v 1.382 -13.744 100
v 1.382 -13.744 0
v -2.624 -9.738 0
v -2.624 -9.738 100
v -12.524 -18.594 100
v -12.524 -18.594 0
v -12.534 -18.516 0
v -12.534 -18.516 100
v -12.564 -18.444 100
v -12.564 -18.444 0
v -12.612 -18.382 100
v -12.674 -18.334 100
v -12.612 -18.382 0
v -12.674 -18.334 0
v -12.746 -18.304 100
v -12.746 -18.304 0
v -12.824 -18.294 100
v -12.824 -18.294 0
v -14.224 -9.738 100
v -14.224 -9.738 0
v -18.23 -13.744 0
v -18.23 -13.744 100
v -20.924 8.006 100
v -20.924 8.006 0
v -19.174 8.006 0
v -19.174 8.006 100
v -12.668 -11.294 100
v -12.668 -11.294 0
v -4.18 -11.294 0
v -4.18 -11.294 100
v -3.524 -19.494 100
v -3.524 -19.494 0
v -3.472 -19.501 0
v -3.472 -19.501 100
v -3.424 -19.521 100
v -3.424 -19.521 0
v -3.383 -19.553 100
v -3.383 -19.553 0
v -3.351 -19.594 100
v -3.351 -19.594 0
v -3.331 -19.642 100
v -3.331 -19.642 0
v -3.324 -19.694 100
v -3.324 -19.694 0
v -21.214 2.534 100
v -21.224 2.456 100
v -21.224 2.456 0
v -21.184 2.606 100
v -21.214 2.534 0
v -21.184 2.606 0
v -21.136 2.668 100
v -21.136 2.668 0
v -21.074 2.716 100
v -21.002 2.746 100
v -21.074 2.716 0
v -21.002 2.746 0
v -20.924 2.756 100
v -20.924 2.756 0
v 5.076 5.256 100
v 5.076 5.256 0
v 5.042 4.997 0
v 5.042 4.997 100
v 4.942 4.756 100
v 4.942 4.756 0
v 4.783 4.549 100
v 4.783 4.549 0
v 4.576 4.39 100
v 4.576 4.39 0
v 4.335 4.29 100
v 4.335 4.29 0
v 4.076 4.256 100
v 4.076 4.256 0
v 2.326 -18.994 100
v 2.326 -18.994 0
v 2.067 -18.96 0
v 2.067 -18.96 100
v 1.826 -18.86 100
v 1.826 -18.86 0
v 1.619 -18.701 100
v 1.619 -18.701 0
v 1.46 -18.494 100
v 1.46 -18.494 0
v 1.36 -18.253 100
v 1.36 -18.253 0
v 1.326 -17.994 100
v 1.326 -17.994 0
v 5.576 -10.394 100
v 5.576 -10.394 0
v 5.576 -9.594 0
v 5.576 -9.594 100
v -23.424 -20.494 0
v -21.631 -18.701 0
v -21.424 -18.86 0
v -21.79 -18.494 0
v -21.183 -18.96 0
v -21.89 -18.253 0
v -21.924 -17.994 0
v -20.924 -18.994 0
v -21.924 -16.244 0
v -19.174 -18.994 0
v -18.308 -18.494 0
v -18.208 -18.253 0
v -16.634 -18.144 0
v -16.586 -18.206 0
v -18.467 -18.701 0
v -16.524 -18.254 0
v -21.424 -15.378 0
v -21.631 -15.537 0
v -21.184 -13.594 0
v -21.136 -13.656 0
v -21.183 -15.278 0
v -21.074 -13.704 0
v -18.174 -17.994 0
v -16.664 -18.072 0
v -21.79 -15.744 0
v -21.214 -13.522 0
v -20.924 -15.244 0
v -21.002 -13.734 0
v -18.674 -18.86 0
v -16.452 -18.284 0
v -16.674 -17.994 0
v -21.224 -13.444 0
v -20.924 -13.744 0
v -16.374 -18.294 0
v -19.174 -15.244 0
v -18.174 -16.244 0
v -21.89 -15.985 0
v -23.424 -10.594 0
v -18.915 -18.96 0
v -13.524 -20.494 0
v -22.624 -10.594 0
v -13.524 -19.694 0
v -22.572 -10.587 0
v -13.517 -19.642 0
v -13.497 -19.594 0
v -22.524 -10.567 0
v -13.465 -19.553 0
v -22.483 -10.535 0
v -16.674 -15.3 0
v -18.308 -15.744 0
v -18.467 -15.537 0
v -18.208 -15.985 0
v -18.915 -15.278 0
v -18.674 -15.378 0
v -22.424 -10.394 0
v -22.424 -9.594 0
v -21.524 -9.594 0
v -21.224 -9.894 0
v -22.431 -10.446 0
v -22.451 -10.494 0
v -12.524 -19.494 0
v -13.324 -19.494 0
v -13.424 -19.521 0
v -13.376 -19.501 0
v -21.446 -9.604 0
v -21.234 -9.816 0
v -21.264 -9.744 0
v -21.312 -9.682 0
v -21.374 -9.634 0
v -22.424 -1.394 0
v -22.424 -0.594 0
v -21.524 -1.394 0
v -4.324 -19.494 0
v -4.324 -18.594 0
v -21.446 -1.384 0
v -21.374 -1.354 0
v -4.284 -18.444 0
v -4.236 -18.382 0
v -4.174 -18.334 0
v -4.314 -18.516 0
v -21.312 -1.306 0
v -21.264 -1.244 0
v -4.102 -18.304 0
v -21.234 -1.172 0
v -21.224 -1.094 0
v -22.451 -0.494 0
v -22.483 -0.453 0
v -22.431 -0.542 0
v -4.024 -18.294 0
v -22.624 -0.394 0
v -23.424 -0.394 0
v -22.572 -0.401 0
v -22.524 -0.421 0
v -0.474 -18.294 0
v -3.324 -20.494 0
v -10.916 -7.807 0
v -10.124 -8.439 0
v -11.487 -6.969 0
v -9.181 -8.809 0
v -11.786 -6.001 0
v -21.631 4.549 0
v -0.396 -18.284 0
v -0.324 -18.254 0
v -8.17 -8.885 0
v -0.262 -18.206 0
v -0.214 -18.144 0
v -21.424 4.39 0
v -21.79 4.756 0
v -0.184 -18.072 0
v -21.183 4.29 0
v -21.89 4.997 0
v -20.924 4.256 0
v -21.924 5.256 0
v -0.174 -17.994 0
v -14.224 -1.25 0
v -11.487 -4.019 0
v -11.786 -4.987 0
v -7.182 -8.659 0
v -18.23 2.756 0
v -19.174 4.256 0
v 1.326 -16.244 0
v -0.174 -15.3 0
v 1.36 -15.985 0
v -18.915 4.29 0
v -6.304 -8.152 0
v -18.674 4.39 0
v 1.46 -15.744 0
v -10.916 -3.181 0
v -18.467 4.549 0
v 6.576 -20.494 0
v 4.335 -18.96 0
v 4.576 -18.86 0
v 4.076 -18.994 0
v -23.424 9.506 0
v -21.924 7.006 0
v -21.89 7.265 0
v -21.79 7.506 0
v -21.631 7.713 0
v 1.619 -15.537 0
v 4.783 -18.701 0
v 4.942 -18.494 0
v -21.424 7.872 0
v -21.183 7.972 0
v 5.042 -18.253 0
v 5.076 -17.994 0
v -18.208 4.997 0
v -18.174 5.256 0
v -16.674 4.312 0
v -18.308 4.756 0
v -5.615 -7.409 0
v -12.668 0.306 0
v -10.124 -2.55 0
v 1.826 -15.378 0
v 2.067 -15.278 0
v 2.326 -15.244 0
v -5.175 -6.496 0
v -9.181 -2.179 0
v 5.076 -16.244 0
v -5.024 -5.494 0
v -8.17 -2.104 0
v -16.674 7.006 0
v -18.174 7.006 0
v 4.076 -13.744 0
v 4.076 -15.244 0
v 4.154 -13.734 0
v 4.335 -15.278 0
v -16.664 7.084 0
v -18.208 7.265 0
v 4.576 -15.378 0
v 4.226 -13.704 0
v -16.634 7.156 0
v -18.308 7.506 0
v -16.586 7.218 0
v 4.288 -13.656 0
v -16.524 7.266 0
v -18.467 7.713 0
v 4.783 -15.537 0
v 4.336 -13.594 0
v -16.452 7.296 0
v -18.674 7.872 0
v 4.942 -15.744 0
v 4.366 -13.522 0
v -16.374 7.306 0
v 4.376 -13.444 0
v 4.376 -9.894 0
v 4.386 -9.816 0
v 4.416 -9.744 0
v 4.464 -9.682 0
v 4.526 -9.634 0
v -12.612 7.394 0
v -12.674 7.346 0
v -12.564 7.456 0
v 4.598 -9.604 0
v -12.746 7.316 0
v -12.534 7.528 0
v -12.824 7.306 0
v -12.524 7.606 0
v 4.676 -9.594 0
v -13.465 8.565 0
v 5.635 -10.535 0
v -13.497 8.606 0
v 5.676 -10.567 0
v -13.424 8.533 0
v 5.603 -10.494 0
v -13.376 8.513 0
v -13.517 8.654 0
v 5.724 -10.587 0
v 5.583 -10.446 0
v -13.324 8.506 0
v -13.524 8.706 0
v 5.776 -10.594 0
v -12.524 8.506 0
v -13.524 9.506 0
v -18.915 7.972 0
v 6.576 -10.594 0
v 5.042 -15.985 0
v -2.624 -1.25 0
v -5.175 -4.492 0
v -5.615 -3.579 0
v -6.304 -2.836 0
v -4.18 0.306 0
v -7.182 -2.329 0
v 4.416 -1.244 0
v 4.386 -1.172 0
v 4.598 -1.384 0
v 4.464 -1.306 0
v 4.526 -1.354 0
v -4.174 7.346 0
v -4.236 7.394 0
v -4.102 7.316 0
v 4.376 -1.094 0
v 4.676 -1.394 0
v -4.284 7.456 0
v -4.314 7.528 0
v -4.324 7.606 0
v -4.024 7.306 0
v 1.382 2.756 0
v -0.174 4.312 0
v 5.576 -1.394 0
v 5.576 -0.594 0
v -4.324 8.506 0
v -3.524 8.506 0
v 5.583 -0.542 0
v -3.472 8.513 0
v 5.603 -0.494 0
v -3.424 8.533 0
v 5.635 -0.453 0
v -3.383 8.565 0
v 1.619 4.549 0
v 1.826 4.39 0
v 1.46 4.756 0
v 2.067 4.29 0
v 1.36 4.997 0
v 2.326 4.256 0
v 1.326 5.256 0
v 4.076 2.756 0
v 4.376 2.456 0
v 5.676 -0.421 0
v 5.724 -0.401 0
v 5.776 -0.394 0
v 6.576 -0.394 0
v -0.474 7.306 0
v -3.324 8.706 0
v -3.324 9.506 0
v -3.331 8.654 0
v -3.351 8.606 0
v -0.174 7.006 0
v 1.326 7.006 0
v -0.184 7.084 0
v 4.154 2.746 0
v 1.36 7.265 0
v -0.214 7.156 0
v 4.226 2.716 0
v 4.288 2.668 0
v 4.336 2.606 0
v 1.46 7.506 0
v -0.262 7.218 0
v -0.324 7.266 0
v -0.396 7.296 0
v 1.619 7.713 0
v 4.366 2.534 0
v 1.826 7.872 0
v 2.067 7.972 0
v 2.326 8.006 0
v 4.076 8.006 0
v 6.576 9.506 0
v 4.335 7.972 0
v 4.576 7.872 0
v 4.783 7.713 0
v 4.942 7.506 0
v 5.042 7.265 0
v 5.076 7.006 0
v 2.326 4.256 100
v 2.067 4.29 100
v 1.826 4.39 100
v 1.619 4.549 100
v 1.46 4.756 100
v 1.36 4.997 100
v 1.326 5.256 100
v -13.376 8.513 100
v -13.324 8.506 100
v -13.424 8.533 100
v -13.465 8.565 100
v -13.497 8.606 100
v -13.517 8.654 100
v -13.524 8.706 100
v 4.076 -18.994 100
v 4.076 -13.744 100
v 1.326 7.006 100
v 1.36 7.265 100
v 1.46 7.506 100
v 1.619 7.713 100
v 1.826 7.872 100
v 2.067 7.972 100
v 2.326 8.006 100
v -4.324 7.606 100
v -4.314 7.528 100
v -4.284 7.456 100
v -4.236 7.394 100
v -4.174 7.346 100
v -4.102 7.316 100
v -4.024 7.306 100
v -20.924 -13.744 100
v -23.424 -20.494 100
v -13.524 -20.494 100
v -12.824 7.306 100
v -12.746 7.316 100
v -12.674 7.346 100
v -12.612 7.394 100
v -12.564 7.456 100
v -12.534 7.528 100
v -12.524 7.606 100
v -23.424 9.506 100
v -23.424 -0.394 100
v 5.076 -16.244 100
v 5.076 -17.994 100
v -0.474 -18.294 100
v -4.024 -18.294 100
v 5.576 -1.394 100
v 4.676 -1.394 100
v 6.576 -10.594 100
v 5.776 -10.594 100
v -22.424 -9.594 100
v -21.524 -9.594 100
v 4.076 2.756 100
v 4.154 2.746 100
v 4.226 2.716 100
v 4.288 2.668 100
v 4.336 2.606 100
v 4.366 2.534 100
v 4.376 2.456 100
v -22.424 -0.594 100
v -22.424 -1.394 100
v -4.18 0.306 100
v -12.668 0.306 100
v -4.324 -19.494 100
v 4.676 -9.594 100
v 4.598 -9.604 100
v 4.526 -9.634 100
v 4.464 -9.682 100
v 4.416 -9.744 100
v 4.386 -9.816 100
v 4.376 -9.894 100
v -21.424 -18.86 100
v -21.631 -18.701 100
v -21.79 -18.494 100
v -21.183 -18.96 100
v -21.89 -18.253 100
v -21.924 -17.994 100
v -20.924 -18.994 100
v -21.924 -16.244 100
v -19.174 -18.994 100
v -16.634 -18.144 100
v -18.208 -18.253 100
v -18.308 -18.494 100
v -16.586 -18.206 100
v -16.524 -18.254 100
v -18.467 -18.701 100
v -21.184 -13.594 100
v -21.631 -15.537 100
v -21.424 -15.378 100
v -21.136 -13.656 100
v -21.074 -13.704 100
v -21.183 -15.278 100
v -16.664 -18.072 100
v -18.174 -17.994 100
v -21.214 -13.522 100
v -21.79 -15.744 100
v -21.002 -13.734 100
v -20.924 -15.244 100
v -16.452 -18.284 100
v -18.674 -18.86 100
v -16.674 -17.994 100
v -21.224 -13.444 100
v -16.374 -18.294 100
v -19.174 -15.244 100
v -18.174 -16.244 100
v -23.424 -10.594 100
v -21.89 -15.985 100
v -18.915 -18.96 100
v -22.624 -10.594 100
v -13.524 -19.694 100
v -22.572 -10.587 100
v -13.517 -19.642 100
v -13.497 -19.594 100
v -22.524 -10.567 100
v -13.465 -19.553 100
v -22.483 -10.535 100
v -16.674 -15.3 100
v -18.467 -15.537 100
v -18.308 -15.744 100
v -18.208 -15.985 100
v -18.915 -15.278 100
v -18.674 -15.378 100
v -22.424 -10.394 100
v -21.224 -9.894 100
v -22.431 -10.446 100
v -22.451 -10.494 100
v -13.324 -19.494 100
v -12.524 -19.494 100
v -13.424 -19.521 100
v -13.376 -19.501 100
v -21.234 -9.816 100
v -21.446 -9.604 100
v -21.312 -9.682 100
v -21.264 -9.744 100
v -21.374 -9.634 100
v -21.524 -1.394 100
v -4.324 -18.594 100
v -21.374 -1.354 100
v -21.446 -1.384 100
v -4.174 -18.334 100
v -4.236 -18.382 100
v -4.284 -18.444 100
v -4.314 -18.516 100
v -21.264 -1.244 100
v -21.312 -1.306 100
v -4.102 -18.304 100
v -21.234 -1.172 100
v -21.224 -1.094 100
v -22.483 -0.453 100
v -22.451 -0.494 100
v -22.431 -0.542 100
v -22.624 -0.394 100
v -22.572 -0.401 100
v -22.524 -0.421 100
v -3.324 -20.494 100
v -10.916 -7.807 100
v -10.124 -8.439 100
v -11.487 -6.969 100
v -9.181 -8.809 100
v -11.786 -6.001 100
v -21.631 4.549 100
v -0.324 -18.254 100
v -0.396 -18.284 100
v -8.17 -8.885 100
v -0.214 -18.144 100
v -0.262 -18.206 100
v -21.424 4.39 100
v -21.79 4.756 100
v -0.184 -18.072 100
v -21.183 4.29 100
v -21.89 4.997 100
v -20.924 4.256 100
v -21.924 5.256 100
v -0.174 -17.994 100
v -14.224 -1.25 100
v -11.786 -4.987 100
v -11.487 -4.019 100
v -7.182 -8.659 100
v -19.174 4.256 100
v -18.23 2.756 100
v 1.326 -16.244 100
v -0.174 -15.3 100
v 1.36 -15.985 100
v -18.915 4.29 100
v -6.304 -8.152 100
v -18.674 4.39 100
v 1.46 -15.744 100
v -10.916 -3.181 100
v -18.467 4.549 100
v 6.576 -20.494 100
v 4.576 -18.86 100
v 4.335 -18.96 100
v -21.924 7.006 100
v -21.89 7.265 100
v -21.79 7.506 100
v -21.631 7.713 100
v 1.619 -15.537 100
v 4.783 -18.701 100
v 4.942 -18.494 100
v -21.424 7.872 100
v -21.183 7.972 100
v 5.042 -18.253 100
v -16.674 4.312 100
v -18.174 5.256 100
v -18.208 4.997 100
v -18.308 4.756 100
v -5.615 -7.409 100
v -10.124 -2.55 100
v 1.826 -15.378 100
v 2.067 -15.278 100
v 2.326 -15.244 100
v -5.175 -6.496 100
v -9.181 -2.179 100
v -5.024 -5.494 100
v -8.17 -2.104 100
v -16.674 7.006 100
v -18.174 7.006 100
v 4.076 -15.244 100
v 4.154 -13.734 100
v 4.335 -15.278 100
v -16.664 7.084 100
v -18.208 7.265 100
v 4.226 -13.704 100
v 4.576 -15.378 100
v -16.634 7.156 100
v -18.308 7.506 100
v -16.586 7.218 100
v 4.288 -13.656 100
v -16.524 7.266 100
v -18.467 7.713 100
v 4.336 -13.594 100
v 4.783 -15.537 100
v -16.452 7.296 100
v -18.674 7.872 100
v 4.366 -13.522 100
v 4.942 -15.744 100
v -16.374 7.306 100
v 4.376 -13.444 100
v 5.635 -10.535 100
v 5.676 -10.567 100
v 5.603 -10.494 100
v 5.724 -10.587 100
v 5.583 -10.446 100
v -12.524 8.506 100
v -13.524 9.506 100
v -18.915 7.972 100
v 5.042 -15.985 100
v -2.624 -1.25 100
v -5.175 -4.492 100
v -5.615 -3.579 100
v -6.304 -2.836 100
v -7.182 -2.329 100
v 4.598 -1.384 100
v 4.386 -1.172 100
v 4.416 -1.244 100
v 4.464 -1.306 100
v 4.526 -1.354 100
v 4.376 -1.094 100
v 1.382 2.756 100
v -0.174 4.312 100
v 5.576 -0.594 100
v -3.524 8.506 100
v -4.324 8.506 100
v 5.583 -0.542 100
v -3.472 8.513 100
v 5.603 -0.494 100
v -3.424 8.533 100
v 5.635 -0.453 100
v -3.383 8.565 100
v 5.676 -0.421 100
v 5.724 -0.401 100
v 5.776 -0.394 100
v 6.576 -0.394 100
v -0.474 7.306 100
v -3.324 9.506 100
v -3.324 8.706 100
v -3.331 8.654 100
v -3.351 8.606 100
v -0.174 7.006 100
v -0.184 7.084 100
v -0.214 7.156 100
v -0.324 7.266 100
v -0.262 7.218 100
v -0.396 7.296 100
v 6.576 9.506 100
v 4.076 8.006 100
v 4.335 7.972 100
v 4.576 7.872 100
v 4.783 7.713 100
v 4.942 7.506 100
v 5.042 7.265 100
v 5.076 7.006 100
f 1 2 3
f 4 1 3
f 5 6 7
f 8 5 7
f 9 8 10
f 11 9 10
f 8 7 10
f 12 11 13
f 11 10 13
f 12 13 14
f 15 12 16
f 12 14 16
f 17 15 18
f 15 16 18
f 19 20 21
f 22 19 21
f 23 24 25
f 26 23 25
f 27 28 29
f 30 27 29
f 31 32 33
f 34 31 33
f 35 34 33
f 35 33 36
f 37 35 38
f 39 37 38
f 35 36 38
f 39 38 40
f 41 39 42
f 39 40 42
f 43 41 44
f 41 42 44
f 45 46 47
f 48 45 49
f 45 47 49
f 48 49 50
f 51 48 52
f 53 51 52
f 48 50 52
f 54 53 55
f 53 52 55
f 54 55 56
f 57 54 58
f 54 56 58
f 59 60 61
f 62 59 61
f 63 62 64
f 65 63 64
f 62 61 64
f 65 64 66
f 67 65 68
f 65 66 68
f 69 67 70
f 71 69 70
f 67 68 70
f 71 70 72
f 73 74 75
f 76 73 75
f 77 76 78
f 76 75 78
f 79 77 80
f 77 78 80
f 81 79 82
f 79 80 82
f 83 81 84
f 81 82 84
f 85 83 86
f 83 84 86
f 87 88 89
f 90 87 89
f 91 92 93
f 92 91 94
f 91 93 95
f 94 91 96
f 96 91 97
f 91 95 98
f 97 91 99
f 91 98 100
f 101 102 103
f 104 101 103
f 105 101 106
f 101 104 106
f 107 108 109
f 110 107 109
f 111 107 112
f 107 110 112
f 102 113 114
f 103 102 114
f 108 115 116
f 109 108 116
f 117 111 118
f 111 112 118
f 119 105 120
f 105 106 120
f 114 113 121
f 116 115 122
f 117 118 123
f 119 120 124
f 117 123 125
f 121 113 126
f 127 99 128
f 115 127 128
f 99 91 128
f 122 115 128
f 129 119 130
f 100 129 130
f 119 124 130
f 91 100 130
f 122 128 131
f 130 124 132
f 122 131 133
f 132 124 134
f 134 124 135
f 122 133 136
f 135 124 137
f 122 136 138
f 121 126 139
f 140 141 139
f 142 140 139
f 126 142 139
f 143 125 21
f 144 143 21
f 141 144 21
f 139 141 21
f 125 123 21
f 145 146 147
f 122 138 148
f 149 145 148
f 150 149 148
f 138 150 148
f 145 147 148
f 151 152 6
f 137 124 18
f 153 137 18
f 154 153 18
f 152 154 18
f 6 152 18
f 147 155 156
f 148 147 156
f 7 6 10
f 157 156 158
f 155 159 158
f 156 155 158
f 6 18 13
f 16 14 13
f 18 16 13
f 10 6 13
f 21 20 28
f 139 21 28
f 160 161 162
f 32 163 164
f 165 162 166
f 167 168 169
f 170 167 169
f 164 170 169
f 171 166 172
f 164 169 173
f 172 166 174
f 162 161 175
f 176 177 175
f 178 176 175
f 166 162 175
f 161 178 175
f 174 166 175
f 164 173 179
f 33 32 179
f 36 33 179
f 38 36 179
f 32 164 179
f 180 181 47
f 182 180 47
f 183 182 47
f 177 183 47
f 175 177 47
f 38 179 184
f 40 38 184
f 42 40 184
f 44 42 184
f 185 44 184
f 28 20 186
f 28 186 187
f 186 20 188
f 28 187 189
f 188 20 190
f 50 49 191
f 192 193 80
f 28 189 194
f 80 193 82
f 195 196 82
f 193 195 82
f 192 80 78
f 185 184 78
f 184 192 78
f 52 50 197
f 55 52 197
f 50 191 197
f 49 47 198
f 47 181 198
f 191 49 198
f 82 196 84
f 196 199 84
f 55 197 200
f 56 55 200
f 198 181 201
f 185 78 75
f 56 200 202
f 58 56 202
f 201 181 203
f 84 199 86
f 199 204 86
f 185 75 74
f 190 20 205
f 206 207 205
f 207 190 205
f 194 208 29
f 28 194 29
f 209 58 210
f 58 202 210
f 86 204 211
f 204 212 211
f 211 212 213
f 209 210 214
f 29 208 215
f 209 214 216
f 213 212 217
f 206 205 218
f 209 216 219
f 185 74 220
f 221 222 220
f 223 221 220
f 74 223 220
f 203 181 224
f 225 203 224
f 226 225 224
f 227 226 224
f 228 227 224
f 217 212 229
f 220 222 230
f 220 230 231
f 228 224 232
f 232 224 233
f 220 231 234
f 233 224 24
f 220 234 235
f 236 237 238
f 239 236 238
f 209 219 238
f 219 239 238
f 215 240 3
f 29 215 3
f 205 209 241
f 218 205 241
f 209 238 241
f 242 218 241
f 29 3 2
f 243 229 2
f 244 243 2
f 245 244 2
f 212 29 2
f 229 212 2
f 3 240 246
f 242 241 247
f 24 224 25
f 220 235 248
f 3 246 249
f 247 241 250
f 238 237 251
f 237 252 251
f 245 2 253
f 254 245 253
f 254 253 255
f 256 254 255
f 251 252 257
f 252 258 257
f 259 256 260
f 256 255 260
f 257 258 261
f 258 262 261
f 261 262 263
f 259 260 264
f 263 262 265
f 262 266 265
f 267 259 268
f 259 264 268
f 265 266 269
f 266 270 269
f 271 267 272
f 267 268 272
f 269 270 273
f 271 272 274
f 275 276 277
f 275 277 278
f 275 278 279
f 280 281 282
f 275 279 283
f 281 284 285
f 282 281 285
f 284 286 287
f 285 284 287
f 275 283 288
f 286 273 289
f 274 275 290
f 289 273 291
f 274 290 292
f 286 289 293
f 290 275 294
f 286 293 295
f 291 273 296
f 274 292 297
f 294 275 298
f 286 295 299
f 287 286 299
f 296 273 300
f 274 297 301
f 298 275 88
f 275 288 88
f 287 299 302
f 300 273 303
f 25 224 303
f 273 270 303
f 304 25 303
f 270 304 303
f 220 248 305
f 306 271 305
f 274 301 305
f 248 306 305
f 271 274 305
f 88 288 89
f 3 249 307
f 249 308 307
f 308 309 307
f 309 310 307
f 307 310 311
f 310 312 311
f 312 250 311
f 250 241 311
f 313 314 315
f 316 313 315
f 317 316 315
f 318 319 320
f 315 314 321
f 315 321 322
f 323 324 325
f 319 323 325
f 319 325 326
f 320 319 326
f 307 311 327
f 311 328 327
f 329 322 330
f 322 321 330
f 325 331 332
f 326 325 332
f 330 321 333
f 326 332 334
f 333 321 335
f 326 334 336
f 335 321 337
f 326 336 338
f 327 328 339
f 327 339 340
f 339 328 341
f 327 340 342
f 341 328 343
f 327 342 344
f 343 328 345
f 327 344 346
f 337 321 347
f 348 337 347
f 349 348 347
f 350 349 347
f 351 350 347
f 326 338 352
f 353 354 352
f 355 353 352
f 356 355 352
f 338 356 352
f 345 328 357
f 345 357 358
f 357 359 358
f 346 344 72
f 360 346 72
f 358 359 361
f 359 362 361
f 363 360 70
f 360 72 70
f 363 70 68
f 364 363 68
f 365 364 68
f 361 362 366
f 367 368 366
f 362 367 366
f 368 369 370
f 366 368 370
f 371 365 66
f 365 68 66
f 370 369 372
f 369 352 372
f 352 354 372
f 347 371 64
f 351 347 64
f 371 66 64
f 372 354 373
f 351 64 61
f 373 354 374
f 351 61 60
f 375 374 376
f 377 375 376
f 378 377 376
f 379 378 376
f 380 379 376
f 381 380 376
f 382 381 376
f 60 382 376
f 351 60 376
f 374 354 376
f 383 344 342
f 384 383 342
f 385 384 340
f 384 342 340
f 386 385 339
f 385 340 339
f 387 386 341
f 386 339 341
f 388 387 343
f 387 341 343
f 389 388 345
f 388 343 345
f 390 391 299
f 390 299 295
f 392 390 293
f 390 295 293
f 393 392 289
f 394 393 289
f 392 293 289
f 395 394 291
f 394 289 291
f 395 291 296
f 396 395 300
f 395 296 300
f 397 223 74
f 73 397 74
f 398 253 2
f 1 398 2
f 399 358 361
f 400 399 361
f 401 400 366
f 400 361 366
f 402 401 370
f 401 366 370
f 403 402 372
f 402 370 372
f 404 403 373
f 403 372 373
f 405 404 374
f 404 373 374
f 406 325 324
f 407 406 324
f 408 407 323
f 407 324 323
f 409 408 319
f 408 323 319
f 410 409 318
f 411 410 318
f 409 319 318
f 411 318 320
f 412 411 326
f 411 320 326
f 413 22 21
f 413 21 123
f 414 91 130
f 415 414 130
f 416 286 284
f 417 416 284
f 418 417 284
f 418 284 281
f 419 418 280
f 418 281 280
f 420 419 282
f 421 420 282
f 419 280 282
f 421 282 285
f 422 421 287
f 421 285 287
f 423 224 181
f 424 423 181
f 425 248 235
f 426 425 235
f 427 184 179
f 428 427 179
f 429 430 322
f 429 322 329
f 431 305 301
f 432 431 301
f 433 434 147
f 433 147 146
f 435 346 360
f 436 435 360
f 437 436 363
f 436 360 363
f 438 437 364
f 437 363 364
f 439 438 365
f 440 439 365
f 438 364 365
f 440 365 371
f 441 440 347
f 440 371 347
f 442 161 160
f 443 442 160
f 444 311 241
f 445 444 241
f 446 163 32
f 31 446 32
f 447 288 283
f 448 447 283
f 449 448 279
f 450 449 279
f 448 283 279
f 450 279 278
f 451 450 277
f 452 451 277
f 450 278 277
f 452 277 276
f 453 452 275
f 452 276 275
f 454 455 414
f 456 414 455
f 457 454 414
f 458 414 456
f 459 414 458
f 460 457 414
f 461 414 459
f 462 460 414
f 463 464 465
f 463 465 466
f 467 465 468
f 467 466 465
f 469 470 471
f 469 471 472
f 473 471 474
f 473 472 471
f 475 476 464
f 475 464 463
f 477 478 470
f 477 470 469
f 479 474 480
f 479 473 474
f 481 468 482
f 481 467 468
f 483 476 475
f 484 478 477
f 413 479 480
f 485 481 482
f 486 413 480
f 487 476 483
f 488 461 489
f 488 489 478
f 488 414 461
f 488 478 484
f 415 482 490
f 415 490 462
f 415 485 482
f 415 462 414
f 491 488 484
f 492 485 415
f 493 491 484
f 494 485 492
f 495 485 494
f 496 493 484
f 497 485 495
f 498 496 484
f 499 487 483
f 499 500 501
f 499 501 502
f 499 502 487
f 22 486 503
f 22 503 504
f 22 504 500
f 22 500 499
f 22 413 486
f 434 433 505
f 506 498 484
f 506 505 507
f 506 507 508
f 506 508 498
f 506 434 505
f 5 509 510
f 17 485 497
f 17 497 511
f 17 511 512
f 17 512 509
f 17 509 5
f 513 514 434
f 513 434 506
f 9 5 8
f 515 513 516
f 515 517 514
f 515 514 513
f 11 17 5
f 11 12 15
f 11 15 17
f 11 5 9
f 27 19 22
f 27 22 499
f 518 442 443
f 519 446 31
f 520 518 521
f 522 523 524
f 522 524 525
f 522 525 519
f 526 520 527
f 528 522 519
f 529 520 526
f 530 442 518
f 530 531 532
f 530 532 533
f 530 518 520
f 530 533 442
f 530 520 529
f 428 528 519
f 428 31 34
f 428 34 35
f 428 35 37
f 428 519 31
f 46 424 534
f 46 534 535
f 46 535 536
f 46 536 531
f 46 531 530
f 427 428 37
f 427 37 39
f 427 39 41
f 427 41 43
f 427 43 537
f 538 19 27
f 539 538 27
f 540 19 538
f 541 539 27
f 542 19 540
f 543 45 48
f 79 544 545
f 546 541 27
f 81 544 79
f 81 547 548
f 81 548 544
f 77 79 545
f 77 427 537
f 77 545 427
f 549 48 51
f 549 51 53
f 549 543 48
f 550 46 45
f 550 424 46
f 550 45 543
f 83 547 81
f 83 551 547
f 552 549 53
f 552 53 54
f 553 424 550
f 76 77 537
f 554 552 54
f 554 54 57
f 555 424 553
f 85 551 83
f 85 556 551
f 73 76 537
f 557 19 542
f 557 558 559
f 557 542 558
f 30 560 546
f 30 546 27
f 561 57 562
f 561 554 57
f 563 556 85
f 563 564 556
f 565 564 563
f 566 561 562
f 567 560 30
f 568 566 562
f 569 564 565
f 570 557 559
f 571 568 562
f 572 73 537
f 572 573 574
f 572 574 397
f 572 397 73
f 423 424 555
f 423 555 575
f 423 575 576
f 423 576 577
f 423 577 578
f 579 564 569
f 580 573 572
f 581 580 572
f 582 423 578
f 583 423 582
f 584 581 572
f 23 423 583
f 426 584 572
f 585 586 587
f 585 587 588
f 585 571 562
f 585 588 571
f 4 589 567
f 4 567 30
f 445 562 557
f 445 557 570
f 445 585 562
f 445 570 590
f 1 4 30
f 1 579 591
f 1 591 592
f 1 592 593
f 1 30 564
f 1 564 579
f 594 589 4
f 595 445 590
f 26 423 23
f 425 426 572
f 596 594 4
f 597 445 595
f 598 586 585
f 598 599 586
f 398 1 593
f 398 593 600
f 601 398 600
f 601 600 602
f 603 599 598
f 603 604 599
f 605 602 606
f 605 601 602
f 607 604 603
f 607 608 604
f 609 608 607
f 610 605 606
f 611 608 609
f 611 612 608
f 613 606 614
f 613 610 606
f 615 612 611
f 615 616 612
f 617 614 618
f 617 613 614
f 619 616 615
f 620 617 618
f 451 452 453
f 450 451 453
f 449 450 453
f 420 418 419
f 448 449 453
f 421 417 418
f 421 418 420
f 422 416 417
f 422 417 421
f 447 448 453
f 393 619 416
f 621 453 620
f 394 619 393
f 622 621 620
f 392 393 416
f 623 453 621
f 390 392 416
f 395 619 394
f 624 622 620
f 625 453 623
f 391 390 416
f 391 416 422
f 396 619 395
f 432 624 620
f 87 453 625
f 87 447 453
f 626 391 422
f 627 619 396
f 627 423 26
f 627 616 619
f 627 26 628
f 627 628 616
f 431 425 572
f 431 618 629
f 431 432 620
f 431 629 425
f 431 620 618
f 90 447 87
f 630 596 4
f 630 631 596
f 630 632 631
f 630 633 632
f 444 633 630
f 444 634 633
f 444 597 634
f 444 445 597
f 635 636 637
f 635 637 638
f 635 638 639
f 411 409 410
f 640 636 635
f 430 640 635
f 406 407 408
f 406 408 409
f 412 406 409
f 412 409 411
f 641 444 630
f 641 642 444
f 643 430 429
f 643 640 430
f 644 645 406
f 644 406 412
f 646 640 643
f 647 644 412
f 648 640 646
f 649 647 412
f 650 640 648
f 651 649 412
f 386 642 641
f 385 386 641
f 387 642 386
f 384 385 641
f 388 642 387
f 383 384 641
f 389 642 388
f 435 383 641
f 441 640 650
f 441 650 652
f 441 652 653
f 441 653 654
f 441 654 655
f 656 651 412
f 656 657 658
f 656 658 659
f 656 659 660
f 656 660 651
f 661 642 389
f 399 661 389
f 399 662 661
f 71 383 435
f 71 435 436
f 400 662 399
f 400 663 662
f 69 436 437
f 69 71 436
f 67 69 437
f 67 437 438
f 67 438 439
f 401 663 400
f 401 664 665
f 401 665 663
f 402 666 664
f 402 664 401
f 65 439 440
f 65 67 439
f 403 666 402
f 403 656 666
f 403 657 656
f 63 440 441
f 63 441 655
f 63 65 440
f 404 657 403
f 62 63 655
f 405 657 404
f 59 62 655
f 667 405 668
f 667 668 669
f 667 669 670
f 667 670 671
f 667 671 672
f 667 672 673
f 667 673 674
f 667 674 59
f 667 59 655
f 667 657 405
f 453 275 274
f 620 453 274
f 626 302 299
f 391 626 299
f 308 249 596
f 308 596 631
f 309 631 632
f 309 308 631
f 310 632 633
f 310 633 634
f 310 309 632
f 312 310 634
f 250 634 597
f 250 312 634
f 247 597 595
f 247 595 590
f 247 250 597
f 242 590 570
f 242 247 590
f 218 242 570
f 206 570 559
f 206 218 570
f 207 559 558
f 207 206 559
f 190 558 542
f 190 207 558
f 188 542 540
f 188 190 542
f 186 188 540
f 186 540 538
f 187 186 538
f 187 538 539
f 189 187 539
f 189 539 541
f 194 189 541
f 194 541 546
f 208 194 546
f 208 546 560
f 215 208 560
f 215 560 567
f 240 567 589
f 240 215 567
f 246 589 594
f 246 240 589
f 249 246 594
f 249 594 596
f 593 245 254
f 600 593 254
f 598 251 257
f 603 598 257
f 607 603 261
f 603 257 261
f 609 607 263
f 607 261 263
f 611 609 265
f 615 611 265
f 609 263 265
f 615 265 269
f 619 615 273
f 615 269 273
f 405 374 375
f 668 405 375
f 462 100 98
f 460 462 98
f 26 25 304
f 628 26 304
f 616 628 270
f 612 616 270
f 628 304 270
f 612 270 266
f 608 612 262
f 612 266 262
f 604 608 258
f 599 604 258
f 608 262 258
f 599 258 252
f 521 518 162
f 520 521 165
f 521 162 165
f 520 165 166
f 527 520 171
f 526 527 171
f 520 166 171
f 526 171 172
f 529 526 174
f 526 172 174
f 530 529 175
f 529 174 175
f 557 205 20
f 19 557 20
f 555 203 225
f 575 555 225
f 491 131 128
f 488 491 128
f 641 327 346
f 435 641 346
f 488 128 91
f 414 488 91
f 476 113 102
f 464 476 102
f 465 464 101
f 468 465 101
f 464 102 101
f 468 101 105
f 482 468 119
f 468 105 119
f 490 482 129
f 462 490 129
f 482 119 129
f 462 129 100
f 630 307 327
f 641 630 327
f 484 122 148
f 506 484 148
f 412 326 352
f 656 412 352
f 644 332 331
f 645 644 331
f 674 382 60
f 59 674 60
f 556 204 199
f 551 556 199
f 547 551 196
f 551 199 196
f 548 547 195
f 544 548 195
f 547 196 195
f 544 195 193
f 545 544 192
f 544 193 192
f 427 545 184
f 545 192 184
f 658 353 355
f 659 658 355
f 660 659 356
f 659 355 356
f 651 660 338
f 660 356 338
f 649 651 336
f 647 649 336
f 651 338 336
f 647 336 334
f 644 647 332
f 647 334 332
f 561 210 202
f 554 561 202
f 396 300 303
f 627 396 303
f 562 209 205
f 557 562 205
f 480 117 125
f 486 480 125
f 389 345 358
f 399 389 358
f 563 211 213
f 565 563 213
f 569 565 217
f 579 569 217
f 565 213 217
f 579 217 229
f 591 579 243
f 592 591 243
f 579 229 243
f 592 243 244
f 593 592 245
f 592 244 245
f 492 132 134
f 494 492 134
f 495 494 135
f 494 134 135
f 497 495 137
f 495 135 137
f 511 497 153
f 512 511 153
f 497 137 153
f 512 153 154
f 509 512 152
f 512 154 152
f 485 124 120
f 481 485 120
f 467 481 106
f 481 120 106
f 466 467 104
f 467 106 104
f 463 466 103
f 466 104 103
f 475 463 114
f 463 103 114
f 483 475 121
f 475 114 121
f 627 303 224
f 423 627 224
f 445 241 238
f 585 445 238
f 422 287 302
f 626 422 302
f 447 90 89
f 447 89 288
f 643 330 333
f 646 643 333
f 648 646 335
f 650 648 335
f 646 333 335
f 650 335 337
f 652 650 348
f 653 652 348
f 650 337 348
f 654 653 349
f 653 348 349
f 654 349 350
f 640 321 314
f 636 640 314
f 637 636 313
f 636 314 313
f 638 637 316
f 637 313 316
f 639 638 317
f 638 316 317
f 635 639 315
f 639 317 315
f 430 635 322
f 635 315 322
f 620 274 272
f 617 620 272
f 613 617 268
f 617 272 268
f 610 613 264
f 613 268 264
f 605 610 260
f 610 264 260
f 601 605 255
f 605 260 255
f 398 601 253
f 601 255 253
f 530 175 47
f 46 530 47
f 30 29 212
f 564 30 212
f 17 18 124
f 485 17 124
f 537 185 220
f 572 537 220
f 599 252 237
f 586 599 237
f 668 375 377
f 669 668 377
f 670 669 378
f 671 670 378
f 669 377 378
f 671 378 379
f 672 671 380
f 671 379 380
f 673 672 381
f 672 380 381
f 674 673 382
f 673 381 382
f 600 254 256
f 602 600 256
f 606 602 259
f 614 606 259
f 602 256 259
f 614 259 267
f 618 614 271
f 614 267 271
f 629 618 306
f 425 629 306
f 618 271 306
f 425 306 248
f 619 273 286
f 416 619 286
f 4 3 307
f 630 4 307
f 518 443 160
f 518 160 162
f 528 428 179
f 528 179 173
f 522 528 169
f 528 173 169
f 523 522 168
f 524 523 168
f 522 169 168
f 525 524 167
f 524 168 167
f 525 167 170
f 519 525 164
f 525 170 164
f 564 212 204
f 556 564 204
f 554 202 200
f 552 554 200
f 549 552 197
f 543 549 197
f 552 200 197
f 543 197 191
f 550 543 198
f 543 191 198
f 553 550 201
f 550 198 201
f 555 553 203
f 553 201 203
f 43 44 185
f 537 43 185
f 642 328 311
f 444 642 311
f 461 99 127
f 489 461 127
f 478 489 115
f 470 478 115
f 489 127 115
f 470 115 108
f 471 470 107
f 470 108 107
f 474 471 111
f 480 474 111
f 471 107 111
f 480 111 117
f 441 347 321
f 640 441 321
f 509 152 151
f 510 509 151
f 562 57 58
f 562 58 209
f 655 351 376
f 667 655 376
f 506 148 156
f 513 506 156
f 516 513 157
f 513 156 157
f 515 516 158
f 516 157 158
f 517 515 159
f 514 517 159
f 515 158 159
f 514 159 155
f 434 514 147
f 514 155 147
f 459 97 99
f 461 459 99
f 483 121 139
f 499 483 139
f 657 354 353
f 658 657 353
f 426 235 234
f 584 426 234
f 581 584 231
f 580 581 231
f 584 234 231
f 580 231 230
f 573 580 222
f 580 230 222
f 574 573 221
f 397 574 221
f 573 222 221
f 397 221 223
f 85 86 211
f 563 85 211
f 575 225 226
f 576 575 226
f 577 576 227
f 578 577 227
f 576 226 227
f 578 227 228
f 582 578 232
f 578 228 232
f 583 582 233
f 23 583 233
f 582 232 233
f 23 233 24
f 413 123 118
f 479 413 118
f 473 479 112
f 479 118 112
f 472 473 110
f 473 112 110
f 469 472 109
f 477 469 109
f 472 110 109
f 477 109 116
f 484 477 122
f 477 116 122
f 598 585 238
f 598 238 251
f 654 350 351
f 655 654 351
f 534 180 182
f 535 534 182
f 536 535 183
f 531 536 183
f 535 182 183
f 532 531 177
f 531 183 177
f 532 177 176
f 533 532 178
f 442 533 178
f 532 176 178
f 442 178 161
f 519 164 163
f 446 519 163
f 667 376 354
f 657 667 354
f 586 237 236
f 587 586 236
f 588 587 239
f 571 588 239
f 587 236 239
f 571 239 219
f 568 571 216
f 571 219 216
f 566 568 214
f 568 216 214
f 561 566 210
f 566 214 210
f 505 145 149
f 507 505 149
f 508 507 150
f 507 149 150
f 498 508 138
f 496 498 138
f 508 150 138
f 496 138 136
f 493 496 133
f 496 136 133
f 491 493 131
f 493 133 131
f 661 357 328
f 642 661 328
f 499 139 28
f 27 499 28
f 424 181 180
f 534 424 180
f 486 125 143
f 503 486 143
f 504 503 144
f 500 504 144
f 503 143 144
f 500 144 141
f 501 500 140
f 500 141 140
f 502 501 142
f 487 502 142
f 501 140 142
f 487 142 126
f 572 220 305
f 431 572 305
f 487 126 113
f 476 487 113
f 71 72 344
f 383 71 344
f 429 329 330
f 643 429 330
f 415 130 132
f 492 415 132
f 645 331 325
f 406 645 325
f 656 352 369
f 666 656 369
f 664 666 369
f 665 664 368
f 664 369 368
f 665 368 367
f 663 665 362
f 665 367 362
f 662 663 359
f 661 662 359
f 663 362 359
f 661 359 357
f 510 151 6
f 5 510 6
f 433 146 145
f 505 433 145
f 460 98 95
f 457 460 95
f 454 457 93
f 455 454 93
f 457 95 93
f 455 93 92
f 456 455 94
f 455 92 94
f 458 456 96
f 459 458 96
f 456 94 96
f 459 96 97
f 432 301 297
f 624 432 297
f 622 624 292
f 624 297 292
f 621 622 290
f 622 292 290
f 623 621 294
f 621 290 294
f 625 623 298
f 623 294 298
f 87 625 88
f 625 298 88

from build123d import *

# Parameters (mm, degrees)
SKETCH_1_R      = 3.4
EXTRUDE_1_DEPTH = 100


with BuildPart() as part:
    # 草图1 → 凸台-拉伸1 (new body)
    with BuildSketch(Plane.XY):
        with BuildLine():
            Line((-23.424024871, 7.005983494), (-23.424024871, -0.394016506))
            Line((-23.424024871, -0.394016506), (-22.624024871, -0.394016506))
            ThreePointArc((-22.624024871, -0.394016506), (-22.482603515, -0.45259515), (-22.424024871, -0.594016506))
            Line((-22.424024871, -0.594016506), (-22.424024871, -1.394016506))
            Line((-22.424024871, -1.394016506), (-21.524024871, -1.394016506))
            ThreePointArc((-21.524024871, -1.394016506), (-21.311892836, -1.306148541), (-21.224024871, -1.094016506))
            Line((-21.224024871, -1.094016506), (-21.224024871, 2.455983494))
            ThreePointArc((-21.224024871, 2.455983494), (-21.136156905, 2.668115528), (-20.924024871, 2.755983494))
            Line((-20.924024871, 2.755983494), (-18.229659789, 2.755983494))
            Line((-18.229659789, 2.755983494), (-14.224024871, -1.249651425))
            Line((-14.224024871, -1.249651425), (-14.224024871, -9.738381588))
            Line((-14.224024871, -9.738381588), (-18.229659789, -13.744016506))
            Line((-18.229659789, -13.744016506), (-20.924024871, -13.744016506))
            ThreePointArc((-20.924024871, -13.744016506), (-21.136156905, -13.656148541), (-21.224024871, -13.444016506))
            Line((-21.224024871, -13.444016506), (-21.224024871, -9.894016506))
            ThreePointArc((-21.224024871, -9.894016506), (-21.311892836, -9.681884472), (-21.524024871, -9.594016506))
            Line((-21.524024871, -9.594016506), (-22.424024871, -9.594016506))
            Line((-22.424024871, -9.594016506), (-22.424024871, -10.394016506))
            ThreePointArc((-22.424024871, -10.394016506), (-22.482603515, -10.535437862), (-22.624024871, -10.594016506))
            Line((-22.624024871, -10.594016506), (-23.424024871, -10.594016506))
            Line((-23.424024871, -10.594016506), (-23.424024871, -17.994016506))
            Line((-23.424024871, -17.994016506), (-23.424024871, -20.494016506))
            Line((-23.424024871, -20.494016506), (-20.924024871, -20.494016506))
            Line((-20.924024871, -20.494016506), (-13.524024871, -20.494016506))
            Line((-13.524024871, -20.494016506), (-13.524024871, -19.694016506))
            ThreePointArc((-13.524024871, -19.694016506), (-13.465446227, -19.55259515), (-13.324024871, -19.494016506))
            Line((-13.324024871, -19.494016506), (-12.524024871, -19.494016506))
            Line((-12.524024871, -19.494016506), (-12.524024871, -18.594016506))
            ThreePointArc((-12.524024871, -18.594016506), (-12.611892836, -18.381884472), (-12.824024871, -18.294016506))
            Line((-12.824024871, -18.294016506), (-16.374024871, -18.294016506))
            ThreePointArc((-16.374024871, -18.294016506), (-16.586156905, -18.206148541), (-16.674024871, -17.994016506))
            Line((-16.674024871, -17.994016506), (-16.674024871, -15.299651425))
            Line((-16.674024871, -15.299651425), (-12.668389952, -11.294016506))
            Line((-12.668389952, -11.294016506), (-4.179659789, -11.294016506))
            Line((-4.179659789, -11.294016506), (-0.174024871, -15.299651425))
            Line((-0.174024871, -15.299651425), (-0.174024871, -17.994016506))
            ThreePointArc((-0.174024871, -17.994016506), (-0.261892836, -18.206148541), (-0.474024871, -18.294016506))
            Line((-0.474024871, -18.294016506), (-4.024024871, -18.294016506))
            ThreePointArc((-4.024024871, -18.294016506), (-4.236156905, -18.381884472), (-4.324024871, -18.594016506))
            Line((-4.324024871, -18.594016506), (-4.324024871, -19.494016506))
            Line((-4.324024871, -19.494016506), (-3.524024871, -19.494016506))
            ThreePointArc((-3.524024871, -19.494016506), (-3.382603515, -19.55259515), (-3.324024871, -19.694016506))
            Line((-3.324024871, -19.694016506), (-3.324024871, -20.494016506))
            Line((-3.324024871, -20.494016506), (4.075975129, -20.494016506))
            Line((4.075975129, -20.494016506), (6.575975129, -20.494016506))
            Line((6.575975129, -20.494016506), (6.575975129, -17.994016506))
            Line((6.575975129, -17.994016506), (6.575975129, -10.594016506))
            Line((6.575975129, -10.594016506), (5.775975129, -10.594016506))
            ThreePointArc((5.775975129, -10.594016506), (5.634553773, -10.535437862), (5.575975129, -10.394016506))
            Line((5.575975129, -10.394016506), (5.575975129, -9.594016506))
            Line((5.575975129, -9.594016506), (4.675975129, -9.594016506))
            ThreePointArc((4.675975129, -9.594016506), (4.463843095, -9.681884472), (4.375975129, -9.894016506))
            Line((4.375975129, -9.894016506), (4.375975129, -13.444016506))
            ThreePointArc((4.375975129, -13.444016506), (4.288107164, -13.656148541), (4.075975129, -13.744016506))
            Line((4.075975129, -13.744016506), (1.381610048, -13.744016506))
            Line((1.381610048, -13.744016506), (-2.624024871, -9.738381588))
            Line((-2.624024871, -9.738381588), (-2.624024871, -1.249651425))
            Line((-2.624024871, -1.249651425), (1.381610048, 2.755983494))
            Line((1.381610048, 2.755983494), (4.075975129, 2.755983494))
            ThreePointArc((4.075975129, 2.755983494), (4.288107164, 2.668115528), (4.375975129, 2.455983494))
            Line((4.375975129, 2.455983494), (4.375975129, -1.094016506))
            ThreePointArc((4.375975129, -1.094016506), (4.463843095, -1.306148541), (4.675975129, -1.394016506))
            Line((4.675975129, -1.394016506), (5.575975129, -1.394016506))
            Line((5.575975129, -1.394016506), (5.575975129, -0.594016506))
            ThreePointArc((5.575975129, -0.594016506), (5.634553773, -0.45259515), (5.775975129, -0.394016506))
            Line((5.775975129, -0.394016506), (6.575975129, -0.394016506))
            Line((6.575975129, -0.394016506), (6.575975129, 7.005983494))
            Line((6.575975129, 7.005983494), (6.575975129, 9.505983494))
            Line((6.575975129, 9.505983494), (4.075975129, 9.505983494))
            Line((4.075975129, 9.505983494), (-3.324024871, 9.505983494))
            Line((-3.324024871, 9.505983494), (-3.324024871, 8.705983494))
            ThreePointArc((-3.324024871, 8.705983494), (-3.382603515, 8.564562138), (-3.524024871, 8.505983494))
            Line((-3.524024871, 8.505983494), (-4.324024871, 8.505983494))
            Line((-4.324024871, 8.505983494), (-4.324024871, 7.605983494))
            ThreePointArc((-4.324024871, 7.605983494), (-4.236156905, 7.393851459), (-4.024024871, 7.305983494))
            Line((-4.024024871, 7.305983494), (-0.474024871, 7.305983494))
            ThreePointArc((-0.474024871, 7.305983494), (-0.261892836, 7.218115528), (-0.174024871, 7.005983494))
            Line((-0.174024871, 7.005983494), (-0.174024871, 4.311618412))
            Line((-0.174024871, 4.311618412), (-4.179659789, 0.305983494))
            Line((-4.179659789, 0.305983494), (-12.668389952, 0.305983494))
            Line((-12.668389952, 0.305983494), (-16.674024871, 4.311618412))
            Line((-16.674024871, 4.311618412), (-16.674024871, 7.005983494))
            ThreePointArc((-16.674024871, 7.005983494), (-16.586156905, 7.218115528), (-16.374024871, 7.305983494))
            Line((-16.374024871, 7.305983494), (-12.824024871, 7.305983494))
            ThreePointArc((-12.824024871, 7.305983494), (-12.611892836, 7.393851459), (-12.524024871, 7.605983494))
            Line((-12.524024871, 7.605983494), (-12.524024871, 8.505983494))
            Line((-12.524024871, 8.505983494), (-13.324024871, 8.505983494))
            ThreePointArc((-13.324024871, 8.505983494), (-13.465446227, 8.564562138), (-13.524024871, 8.705983494))
            Line((-13.524024871, 8.705983494), (-13.524024871, 9.505983494))
            Line((-13.524024871, 9.505983494), (-20.924024871, 9.505983494))
            Line((-20.924024871, 9.505983494), (-23.424024871, 9.505983494))
            Line((-23.424024871, 9.505983494), (-23.424024871, 7.005983494))
        make_face()
        with Locations((-8.424024871, -5.494016506)):
            Circle(SKETCH_1_R, mode=Mode.SUBTRACT)
        with BuildLine():
            Line((2.325975129, -15.244016506), (4.075975129, -15.244016506))
            ThreePointArc((4.075975129, -15.244016506), (4.78308191, -15.536909725), (5.075975129, -16.244016506))
            Line((5.075975129, -16.244016506), (5.075975129, -17.994016506))
            ThreePointArc((5.075975129, -17.994016506), (4.78308191, -18.701123287), (4.075975129, -18.994016506))
            Line((4.075975129, -18.994016506), (2.325975129, -18.994016506))
            ThreePointArc((2.325975129, -18.994016506), (1.618868348, -18.701123287), (1.325975129, -17.994016506))
            Line((1.325975129, -17.994016506), (1.325975129, -16.244016506))
            ThreePointArc((1.325975129, -16.244016506), (1.618868348, -15.536909725), (2.325975129, -15.244016506))
        make_face(mode=Mode.SUBTRACT)
        with BuildLine():
            Line((1.325975129, 5.255983494), (1.325975129, 7.005983494))
            ThreePointArc((1.325975129, 7.005983494), (1.618868348, 7.713090275), (2.325975129, 8.005983494))
            Line((2.325975129, 8.005983494), (4.075975129, 8.005983494))
            ThreePointArc((4.075975129, 8.005983494), (4.78308191, 7.713090275), (5.075975129, 7.005983494))
            Line((5.075975129, 7.005983494), (5.075975129, 5.255983494))
            ThreePointArc((5.075975129, 5.255983494), (4.78308191, 4.548876713), (4.075975129, 4.255983494))
            Line((4.075975129, 4.255983494), (2.325975129, 4.255983494))
            ThreePointArc((2.325975129, 4.255983494), (1.618868348, 4.548876713), (1.325975129, 5.255983494))
        make_face(mode=Mode.SUBTRACT)
        with BuildLine():
            Line((-18.174024871, -16.244016506), (-18.174024871, -17.994016506))
            ThreePointArc((-18.174024871, -17.994016506), (-18.46691809, -18.701123287), (-19.174024871, -18.994016506))
            Line((-19.174024871, -18.994016506), (-20.924024871, -18.994016506))
            ThreePointArc((-20.924024871, -18.994016506), (-21.631131652, -18.701123287), (-21.924024871, -17.994016506))
            Line((-21.924024871, -17.994016506), (-21.924024871, -16.244016506))
            ThreePointArc((-21.924024871, -16.244016506), (-21.631131652, -15.536909725), (-20.924024871, -15.244016506))
            Line((-20.924024871, -15.244016506), (-19.174024871, -15.244016506))
            ThreePointArc((-19.174024871, -15.244016506), (-18.46691809, -15.536909725), (-18.174024871, -16.244016506))
        make_face(mode=Mode.SUBTRACT)
        with BuildLine():
            Line((-19.174024871, 4.255983494), (-20.924024871, 4.255983494))
            ThreePointArc((-20.924024871, 4.255983494), (-21.631131652, 4.548876713), (-21.924024871, 5.255983494))
            Line((-21.924024871, 5.255983494), (-21.924024871, 7.005983494))
            ThreePointArc((-21.924024871, 7.005983494), (-21.631131652, 7.713090275), (-20.924024871, 8.005983494))
            Line((-20.924024871, 8.005983494), (-19.174024871, 8.005983494))
            ThreePointArc((-19.174024871, 8.005983494), (-18.46691809, 7.713090275), (-18.174024871, 7.005983494))
            Line((-18.174024871, 7.005983494), (-18.174024871, 5.255983494))
            ThreePointArc((-18.174024871, 5.255983494), (-18.46691809, 4.548876713), (-19.174024871, 4.255983494))
        make_face(mode=Mode.SUBTRACT)
    extrude(amount=EXTRUDE_1_DEPTH)


solid = part.part
